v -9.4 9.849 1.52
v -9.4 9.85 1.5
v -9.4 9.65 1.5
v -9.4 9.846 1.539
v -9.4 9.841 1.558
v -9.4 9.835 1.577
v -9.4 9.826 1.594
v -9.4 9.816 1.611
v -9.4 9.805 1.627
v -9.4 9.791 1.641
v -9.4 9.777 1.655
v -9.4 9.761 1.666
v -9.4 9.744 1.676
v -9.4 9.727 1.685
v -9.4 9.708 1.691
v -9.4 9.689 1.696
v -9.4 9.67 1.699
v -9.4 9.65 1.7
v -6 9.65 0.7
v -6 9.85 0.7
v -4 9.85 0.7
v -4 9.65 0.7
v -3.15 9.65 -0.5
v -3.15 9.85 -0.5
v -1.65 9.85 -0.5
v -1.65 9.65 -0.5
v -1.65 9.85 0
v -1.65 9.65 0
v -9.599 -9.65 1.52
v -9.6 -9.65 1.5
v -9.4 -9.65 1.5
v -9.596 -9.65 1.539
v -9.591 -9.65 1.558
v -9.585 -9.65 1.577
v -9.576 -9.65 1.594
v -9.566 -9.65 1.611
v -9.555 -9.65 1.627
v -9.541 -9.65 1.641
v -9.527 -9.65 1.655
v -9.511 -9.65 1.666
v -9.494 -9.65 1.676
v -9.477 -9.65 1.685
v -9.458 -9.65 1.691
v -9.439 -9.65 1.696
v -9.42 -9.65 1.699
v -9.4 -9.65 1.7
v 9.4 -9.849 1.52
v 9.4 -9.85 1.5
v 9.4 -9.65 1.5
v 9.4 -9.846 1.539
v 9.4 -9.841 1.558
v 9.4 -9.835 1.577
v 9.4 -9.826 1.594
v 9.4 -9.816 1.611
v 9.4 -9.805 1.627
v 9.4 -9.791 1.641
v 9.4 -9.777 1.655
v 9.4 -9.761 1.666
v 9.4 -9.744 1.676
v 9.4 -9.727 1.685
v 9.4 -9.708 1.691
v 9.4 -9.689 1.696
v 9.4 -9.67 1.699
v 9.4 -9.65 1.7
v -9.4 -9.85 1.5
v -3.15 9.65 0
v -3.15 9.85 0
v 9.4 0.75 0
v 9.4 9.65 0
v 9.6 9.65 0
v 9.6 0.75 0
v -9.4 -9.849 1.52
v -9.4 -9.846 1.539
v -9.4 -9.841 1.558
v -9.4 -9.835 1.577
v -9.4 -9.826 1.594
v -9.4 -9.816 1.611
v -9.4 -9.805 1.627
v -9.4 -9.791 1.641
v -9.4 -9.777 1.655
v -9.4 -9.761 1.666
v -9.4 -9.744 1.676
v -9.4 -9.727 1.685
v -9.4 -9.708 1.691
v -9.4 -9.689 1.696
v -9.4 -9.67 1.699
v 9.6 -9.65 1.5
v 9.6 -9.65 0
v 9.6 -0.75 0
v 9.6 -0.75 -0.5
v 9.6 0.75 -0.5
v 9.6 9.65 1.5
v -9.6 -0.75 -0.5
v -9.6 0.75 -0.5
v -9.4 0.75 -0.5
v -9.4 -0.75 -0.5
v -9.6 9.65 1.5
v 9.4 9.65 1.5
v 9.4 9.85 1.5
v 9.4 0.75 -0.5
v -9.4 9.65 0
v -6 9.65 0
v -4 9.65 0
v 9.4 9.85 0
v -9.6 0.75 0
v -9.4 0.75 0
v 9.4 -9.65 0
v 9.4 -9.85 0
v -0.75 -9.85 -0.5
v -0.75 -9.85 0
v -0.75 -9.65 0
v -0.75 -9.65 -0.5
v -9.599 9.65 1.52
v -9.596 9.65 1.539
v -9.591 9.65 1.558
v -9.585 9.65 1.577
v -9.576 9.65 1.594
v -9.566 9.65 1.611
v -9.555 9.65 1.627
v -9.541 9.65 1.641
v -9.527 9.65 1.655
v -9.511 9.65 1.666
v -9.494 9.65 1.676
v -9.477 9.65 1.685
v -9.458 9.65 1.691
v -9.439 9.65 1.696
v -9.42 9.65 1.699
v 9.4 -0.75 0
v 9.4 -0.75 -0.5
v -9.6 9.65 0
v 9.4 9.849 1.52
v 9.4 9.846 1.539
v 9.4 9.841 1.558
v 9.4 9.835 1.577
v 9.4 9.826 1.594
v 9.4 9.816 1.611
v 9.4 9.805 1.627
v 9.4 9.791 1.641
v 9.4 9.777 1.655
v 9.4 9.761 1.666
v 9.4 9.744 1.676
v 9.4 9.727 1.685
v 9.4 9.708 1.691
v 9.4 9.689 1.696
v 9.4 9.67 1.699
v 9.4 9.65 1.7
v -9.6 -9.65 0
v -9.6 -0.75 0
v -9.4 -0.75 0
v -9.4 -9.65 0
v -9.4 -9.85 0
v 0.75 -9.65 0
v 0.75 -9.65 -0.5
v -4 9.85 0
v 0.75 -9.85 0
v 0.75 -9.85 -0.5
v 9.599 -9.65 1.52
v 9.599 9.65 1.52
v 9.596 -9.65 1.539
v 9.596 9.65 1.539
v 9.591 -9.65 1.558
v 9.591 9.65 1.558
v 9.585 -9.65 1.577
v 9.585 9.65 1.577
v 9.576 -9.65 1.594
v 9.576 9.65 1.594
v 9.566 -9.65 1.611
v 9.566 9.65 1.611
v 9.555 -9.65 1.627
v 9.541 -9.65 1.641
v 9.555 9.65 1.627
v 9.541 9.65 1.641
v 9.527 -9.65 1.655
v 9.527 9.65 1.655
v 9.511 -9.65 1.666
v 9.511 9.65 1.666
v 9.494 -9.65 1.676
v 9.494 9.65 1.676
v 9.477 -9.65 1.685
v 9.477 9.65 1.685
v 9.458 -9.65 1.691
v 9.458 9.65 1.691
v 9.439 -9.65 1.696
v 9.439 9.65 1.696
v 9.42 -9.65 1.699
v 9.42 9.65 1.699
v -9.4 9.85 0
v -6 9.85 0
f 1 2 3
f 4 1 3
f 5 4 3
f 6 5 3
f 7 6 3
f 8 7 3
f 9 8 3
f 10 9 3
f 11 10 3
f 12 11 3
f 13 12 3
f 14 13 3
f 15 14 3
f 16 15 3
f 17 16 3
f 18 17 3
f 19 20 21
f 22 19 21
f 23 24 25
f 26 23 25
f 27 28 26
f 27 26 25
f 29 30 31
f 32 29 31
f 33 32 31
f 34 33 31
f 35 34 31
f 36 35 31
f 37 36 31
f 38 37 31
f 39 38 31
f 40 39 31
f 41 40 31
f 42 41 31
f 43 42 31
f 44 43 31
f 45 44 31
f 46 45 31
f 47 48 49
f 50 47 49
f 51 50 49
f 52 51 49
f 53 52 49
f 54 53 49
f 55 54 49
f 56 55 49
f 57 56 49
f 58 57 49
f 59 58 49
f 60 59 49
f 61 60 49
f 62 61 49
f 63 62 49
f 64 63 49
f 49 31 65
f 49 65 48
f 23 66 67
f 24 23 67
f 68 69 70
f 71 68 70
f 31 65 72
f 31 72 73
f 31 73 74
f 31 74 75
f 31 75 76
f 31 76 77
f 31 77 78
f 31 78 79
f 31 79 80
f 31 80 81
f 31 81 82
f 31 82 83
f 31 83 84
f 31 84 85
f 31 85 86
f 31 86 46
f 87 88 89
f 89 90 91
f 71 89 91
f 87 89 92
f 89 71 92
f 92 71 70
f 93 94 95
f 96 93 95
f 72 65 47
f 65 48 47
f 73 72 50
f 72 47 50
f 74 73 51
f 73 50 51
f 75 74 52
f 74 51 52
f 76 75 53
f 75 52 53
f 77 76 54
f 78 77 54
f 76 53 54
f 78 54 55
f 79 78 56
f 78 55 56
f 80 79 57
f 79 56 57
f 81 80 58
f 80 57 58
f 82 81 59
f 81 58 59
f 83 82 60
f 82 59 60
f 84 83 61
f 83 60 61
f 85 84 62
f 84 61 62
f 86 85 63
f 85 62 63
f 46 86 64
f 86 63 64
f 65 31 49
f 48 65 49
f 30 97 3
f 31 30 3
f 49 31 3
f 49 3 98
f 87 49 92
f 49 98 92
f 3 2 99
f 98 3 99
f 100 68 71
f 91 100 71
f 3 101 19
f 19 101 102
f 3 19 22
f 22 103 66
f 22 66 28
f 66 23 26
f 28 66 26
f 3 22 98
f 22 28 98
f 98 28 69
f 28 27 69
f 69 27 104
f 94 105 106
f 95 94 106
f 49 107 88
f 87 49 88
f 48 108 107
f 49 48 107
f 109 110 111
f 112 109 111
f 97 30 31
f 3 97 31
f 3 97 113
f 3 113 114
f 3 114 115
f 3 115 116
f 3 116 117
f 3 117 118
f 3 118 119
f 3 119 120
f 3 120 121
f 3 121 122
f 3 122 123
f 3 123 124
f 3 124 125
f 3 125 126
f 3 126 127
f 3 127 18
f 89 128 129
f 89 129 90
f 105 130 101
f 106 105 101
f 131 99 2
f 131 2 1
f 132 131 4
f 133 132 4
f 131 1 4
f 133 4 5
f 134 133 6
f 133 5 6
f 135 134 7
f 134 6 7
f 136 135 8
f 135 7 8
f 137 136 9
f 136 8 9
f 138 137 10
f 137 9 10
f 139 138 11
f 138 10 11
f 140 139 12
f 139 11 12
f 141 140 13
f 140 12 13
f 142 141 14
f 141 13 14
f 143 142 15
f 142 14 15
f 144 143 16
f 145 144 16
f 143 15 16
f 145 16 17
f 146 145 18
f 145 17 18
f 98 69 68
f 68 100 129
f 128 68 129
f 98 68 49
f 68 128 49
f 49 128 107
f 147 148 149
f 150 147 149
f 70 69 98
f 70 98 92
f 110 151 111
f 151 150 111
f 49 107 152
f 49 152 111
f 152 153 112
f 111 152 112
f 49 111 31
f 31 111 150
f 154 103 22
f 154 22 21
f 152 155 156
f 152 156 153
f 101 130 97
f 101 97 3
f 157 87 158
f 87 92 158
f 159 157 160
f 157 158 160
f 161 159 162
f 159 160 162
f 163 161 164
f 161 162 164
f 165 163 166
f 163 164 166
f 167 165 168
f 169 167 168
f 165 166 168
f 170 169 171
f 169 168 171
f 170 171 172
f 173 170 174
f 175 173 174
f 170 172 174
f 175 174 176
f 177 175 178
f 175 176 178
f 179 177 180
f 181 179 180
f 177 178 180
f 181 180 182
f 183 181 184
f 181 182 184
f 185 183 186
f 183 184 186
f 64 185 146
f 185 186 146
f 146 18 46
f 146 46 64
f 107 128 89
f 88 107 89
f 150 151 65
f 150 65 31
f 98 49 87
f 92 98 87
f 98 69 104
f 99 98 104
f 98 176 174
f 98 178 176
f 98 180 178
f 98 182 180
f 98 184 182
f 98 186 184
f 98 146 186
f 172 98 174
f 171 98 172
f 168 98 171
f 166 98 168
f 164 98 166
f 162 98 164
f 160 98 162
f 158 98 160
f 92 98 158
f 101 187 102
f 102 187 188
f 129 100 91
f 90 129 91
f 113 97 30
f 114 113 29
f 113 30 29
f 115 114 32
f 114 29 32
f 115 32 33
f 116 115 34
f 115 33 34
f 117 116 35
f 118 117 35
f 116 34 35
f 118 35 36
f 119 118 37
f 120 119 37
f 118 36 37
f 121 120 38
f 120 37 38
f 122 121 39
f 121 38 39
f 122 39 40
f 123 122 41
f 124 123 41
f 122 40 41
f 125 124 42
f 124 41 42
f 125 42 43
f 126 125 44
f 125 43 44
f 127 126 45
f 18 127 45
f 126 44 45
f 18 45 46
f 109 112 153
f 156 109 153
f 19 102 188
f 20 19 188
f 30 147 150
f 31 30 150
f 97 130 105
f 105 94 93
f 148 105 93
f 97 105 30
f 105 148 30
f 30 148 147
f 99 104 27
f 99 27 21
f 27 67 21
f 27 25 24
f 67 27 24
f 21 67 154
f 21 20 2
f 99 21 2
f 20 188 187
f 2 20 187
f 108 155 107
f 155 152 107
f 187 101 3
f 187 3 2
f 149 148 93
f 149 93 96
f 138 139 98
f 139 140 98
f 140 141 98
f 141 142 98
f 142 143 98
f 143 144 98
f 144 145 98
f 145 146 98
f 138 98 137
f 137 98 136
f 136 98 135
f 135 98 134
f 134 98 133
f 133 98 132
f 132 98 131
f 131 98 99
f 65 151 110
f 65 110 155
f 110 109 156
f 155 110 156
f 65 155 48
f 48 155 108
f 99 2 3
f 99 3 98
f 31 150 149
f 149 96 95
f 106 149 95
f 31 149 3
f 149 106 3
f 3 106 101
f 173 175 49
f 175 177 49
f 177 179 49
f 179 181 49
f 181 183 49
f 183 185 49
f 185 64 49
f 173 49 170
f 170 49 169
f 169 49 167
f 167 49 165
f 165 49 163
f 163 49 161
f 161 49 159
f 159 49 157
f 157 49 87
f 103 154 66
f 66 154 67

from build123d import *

# Parameters (mm, degrees)
F0_W     = 3.4
F0_H     = 0.2
F0_W_2   = 2
F0_W_3   = 0.85
F0_W_4   = 1.5
F0_W_5   = 11.05
F1_DEPTH = 1.5
F0_W_6   = 0.2
F0_H_2   = 8.9
F0_H_3   = 1.5
F2_DEPTH = 1.5
F3_DEPTH = 1.5
F0_W_7   = 8.65
F4_DEPTH = 1.5
F5_START = 1.5
F5_DEPTH = 0.2
F6_DEPTH = 0.7
F7_DEPTH = 0.5
F8_R     = 0.1999


# Not quite as in the source:
# - a fillet or chamfer is up to 0.001 mm smaller than in the source, because OpenCascade refuses the exact size


with BuildPart() as f1:
    # F0 (on Top) → F1 (new body)
    with BuildSketch(Plane.XY):
        with Locations((-7.7, 9.75)):
            Rectangle(F0_W, F0_H)
        with Locations((-5, 9.75)):
            Rectangle(F0_W_2, F0_H)
        with Locations((-3.575, 9.75)):
            Rectangle(F0_W_3, F0_H)
        with Locations((-2.4, 9.75)):
            Rectangle(F0_W_4, F0_H)
        with Locations((3.875, 9.75)):
            Rectangle(F0_W_5, F0_H)
    extrude(amount=F1_DEPTH)

    # F0 (on Top) → F6 (cut)
    with BuildSketch(Plane.XY):
        with Locations((-5, 9.75)):
            Rectangle(F0_W_2, F0_H)
    extrude(amount=F6_DEPTH, mode=Mode.SUBTRACT)

    # F0 (on Top) → F7 (join)
    with BuildSketch(Plane.XY):
        with Locations((-2.4, 9.75)):
            Rectangle(F0_W_4, F0_H)
    extrude(amount=-F7_DEPTH)


with BuildPart() as f2:
    # F0 (on Top) → F2 (new body)
    with BuildSketch(Plane.XY):
        with Locations((9.5, 5.2)):
            Rectangle(F0_W_6, F0_H_2)
        with Locations((9.5, 0)):
            Rectangle(F0_W_6, F0_H_3)
        with Locations((9.5, -5.2)):
            Rectangle(F0_W_6, F0_H_2)
    extrude(amount=F2_DEPTH)

    # F0 (on Top) → F7, piece 2 (join)
    with BuildSketch(Plane.XY):
        with Locations((9.5, 0)):
            Rectangle(F0_W_6, F0_H_3)
    extrude(amount=-F7_DEPTH)


with BuildPart() as f3:
    # F0 (on Top) → F3 (new body)
    with BuildSketch(Plane.XY):
        with Locations((-9.5, 5.2)):
            Rectangle(F0_W_6, F0_H_2)
        with Locations((-9.5, 0)):
            Rectangle(F0_W_6, F0_H_3)
        with Locations((-9.5, -5.2)):
            Rectangle(F0_W_6, F0_H_2)
    extrude(amount=F3_DEPTH)

    # F0 (on Top) → F7, piece 4 (join)
    with BuildSketch(Plane.XY):
        with Locations((-9.5, 0)):
            Rectangle(F0_W_6, F0_H_3)
    extrude(amount=-F7_DEPTH)


with BuildPart() as f4:
    # F0 (on Top) → F4 (new body)
    with BuildSketch(Plane.XY):
        with Locations((0, -9.75)):
            Rectangle(F0_W_4, F0_H)
        with Locations((5.075, -9.75)):
            Rectangle(F0_W_7, F0_H)
        with Locations((-5.075, -9.75)):
            Rectangle(F0_W_7, F0_H)
    extrude(amount=F4_DEPTH)

    # F0 (on Top) → F7, piece 3 (join)
    with BuildSketch(Plane.XY):
        with Locations((0, -9.75)):
            Rectangle(F0_W_4, F0_H)
    extrude(amount=-F7_DEPTH)


with BuildPart() as f5:
    # F0 (on Top) → F5 (new body)
    with BuildSketch(Plane.XY.offset(F5_START)):
        with Locations((-7.7, 9.75)):
            Rectangle(F0_W, F0_H)
        with Locations((-5, 9.75)):
            Rectangle(F0_W_2, F0_H)
        with Locations((-3.575, 9.75)):
            Rectangle(F0_W_3, F0_H)
        with Locations((-2.4, 9.75)):
            Rectangle(F0_W_4, F0_H)
        with Locations((3.875, 9.75)):
            Rectangle(F0_W_5, F0_H)
        with Locations((9.5, 5.2)):
            Rectangle(F0_W_6, F0_H_2)
        Polygon((9.4, 0.75), (9.4, 9.65), (-1.65, 9.65), (-3.15, 9.65), (-4, 9.65), (-6, 9.65), (-9.4, 9.65), (-9.4, 0.75), (-9.4, -0.75), (-9.4, -9.65), (-0.75, -9.65), (0.75, -9.65), (9.4, -9.65), (9.4, -0.75), align=None)
        with Locations((-9.5, 5.2)):
            Rectangle(F0_W_6, F0_H_2)
        with Locations((-9.5, 0)):
            Rectangle(F0_W_6, F0_H_3)
        with Locations((-9.5, -5.2)):
            Rectangle(F0_W_6, F0_H_2)
        with Locations((-5.075, -9.75)):
            Rectangle(F0_W_7, F0_H)
        with Locations((0, -9.75)):
            Rectangle(F0_W_4, F0_H)
        with Locations((5.075, -9.75)):
            Rectangle(F0_W_7, F0_H)
        with Locations((9.5, -5.2)):
            Rectangle(F0_W_6, F0_H_2)
        with Locations((9.5, 0)):
            Rectangle(F0_W_6, F0_H_3)
    extrude(amount=F5_DEPTH)

    # F8 (radius 0.2 in the source; OpenCascade refuses exactly that, so slightly less here)
    f8_edges = [f5.edges().sort_by_distance(p)[0] for p in [
        (-9.6, 0, 1.7),
        (0, 9.85, 1.7),
        (9.6, 0, 1.7),
        (0, -9.85, 1.7),
    ]]
    fillet(f8_edges, radius=F8_R)


solid = Compound([f1.part, f2.part, f3.part, f4.part, f5.part])
